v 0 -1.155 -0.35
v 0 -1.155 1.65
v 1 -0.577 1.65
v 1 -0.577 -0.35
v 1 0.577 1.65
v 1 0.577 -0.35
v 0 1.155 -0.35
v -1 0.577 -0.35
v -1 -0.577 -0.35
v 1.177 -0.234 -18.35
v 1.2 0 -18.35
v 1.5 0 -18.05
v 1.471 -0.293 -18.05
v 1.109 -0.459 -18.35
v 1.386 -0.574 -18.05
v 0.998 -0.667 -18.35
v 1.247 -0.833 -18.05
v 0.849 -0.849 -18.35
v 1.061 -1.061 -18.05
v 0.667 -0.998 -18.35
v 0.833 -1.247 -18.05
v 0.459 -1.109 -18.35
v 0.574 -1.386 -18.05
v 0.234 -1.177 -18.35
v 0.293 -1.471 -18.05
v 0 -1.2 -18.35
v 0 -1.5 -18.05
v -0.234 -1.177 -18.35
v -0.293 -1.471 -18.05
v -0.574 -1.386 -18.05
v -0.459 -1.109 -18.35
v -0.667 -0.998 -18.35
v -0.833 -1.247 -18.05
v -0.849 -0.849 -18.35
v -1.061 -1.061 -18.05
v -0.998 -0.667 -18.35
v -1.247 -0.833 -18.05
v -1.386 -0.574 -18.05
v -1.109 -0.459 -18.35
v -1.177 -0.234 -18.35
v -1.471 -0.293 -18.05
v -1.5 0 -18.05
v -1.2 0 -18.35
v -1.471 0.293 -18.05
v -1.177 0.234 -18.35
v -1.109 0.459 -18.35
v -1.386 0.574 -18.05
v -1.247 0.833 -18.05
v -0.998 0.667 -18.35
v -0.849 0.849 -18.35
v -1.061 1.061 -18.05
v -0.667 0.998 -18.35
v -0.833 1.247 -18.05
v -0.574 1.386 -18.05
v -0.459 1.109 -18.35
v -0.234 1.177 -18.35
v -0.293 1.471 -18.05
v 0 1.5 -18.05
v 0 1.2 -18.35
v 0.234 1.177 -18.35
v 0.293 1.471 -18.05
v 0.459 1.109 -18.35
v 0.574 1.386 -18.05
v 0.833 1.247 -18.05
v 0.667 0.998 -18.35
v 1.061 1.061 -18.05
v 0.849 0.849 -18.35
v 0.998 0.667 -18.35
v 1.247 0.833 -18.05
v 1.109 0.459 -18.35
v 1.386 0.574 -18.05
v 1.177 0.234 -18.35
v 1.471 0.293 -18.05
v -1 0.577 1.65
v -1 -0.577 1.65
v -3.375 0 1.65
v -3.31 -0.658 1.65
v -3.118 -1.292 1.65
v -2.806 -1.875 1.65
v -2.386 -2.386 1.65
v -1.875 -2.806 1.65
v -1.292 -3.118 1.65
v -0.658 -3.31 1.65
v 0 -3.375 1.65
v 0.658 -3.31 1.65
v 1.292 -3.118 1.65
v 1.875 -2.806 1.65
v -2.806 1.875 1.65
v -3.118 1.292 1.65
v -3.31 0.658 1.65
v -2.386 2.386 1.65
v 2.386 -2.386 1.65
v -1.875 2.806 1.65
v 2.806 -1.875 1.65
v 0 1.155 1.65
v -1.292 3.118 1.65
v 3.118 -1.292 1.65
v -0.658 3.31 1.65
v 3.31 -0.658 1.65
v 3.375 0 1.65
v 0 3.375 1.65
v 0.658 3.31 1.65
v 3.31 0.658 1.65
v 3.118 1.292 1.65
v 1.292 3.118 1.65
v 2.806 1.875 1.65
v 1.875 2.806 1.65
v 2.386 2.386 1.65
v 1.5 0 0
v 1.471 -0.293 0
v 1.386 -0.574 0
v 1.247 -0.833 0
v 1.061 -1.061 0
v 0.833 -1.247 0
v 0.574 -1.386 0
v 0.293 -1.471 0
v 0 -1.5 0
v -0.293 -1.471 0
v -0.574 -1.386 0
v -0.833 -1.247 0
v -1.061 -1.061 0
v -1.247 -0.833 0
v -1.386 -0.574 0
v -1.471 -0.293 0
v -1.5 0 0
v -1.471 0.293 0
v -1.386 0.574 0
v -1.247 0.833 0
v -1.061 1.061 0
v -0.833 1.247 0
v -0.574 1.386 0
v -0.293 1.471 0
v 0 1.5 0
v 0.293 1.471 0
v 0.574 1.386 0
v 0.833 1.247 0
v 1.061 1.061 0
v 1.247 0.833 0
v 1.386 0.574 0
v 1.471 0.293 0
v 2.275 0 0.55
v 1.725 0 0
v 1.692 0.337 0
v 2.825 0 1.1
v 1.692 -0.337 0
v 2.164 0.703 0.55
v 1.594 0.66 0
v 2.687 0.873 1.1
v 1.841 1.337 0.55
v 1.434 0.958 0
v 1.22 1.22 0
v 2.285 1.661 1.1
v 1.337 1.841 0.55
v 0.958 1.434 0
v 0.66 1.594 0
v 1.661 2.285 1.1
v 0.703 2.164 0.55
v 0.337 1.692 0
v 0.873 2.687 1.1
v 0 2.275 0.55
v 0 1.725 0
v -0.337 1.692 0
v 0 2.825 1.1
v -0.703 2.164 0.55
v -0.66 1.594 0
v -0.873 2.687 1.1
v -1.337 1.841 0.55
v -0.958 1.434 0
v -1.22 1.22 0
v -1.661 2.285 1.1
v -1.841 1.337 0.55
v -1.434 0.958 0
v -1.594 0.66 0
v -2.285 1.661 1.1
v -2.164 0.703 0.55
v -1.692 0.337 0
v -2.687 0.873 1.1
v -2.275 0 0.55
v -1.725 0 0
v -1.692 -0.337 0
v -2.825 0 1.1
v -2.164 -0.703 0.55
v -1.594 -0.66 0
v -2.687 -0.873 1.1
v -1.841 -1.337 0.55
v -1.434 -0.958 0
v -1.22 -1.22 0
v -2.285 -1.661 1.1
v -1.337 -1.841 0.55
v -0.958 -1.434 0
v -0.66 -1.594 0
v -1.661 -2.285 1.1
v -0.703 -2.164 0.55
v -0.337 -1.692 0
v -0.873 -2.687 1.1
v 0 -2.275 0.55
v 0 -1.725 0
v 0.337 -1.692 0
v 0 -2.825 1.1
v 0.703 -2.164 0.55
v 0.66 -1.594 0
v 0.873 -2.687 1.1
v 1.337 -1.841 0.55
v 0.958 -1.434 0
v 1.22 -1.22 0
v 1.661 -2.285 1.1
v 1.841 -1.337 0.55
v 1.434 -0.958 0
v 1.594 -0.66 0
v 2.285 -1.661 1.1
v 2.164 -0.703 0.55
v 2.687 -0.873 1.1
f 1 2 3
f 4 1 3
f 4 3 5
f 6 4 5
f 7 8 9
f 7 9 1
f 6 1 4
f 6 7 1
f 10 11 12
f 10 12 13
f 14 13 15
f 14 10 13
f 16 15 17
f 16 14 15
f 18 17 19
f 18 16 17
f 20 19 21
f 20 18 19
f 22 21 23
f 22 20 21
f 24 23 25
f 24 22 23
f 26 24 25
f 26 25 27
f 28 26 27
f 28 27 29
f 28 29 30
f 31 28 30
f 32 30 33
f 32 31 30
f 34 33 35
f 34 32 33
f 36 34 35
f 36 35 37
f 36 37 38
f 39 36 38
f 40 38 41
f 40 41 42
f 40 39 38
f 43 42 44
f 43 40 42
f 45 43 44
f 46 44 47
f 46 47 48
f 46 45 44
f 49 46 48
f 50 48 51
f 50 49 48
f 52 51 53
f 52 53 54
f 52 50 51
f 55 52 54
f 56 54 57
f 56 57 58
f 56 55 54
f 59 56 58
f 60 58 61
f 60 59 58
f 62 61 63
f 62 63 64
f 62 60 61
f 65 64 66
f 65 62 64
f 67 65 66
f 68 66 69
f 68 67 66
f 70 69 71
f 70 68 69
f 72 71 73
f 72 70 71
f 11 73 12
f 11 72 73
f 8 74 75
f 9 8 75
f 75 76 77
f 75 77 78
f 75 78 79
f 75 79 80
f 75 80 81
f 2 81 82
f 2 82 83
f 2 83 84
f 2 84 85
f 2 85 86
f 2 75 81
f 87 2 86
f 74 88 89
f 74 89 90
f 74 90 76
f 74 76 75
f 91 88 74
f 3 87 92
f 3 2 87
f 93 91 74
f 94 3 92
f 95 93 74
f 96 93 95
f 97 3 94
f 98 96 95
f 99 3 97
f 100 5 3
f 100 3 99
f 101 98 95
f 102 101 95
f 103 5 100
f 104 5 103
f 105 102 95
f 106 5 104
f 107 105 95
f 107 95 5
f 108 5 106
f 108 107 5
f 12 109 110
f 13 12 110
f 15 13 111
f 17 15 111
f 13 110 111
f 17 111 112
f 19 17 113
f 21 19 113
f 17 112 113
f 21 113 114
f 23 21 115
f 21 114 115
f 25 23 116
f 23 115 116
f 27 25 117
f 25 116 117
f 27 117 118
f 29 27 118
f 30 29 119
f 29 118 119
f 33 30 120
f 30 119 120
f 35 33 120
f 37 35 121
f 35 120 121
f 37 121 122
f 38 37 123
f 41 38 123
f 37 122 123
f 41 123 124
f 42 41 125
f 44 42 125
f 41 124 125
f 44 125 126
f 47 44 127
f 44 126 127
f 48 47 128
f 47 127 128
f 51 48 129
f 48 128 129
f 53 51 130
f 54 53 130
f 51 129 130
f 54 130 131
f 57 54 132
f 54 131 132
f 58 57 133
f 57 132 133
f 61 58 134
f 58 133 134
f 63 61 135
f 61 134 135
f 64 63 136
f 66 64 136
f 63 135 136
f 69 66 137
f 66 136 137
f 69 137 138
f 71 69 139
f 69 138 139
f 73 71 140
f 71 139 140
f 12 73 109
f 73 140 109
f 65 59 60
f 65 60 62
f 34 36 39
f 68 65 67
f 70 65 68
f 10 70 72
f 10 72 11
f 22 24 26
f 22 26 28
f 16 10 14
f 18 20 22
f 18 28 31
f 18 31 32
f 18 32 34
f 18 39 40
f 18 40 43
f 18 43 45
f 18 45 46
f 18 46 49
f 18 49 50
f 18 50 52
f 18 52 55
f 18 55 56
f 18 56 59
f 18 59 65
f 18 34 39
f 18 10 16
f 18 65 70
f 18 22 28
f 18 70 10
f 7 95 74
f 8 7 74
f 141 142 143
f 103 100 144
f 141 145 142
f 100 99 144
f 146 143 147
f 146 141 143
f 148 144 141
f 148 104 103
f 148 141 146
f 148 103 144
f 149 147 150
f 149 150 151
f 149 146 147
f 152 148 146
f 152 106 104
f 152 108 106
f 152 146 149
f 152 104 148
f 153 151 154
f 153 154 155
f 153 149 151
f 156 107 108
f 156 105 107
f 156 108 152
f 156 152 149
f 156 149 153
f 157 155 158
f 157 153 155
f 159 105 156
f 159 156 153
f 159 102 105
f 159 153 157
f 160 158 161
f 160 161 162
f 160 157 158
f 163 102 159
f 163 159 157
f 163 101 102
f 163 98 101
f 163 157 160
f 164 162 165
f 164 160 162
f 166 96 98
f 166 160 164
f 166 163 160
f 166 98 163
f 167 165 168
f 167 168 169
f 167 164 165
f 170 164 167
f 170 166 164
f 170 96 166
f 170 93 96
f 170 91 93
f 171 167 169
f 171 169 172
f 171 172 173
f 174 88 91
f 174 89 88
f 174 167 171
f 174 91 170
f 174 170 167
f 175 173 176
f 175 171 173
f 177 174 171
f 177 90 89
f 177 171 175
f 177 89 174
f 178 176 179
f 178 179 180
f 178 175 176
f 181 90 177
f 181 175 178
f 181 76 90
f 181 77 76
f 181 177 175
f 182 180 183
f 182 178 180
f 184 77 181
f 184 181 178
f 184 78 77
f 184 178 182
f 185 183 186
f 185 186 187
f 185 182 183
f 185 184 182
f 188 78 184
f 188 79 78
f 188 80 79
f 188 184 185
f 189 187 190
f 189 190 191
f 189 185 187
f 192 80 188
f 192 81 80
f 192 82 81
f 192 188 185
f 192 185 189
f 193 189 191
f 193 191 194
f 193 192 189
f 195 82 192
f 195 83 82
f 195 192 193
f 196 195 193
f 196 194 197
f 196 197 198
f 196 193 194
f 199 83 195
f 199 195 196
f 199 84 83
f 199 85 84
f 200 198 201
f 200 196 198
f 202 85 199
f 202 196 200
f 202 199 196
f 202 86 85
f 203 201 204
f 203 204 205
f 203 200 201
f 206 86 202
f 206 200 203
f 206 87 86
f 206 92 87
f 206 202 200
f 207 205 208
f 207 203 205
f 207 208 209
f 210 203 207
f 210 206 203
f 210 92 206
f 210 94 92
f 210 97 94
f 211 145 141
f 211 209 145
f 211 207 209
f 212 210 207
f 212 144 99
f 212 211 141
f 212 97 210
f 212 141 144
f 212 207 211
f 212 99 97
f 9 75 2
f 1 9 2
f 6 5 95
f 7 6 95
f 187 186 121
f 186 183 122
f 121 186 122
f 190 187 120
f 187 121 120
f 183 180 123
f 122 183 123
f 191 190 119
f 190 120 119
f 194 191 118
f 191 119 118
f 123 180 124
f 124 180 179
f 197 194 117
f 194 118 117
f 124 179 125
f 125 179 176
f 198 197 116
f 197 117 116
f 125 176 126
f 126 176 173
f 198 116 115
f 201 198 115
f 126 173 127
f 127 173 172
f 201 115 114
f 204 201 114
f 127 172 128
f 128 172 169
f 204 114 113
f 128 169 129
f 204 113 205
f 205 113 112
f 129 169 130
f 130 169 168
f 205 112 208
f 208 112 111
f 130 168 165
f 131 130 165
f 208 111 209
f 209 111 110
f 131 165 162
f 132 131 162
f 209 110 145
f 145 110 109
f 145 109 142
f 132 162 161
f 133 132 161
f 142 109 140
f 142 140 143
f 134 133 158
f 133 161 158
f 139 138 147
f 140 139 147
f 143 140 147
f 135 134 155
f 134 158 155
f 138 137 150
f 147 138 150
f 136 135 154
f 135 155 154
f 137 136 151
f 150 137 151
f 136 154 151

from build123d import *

# Parameters (mm, degrees)
SKETCH1_R           = 3.375
BOSS_EXTRUDE1_DEPTH = 1.65
SKETCH2_R           = 1.5
BOSS_EXTRUDE2_DEPTH = 18.35
CHAMFER1_SIZE       = 0.3
CUT_EXTRUDE1_DEPTH  = 2
CHAMFER2_SIZE       = 1.65


with BuildPart() as part:
    # Sketch1 → Boss-Extrude1 (new body)
    with BuildSketch(Plane.XY):
        Circle(SKETCH1_R)
    extrude(amount=BOSS_EXTRUDE1_DEPTH)

    # Sketch2 → Boss-Extrude2 (add)
    with BuildSketch(Plane(origin=(0, 0, 0), x_dir=(-1, 0, 0), z_dir=(0, 0, -1))):
        with Locations(Location((0, 0, 0), (0, 0, 180))):
            Circle(SKETCH2_R)
    extrude(amount=BOSS_EXTRUDE2_DEPTH)

    # Chamfer1
    chamfer1_edges = [part.edges().sort_by_distance(p)[0] for p in [
        (-1.5, 0, -18.35),
    ]]
    chamfer(chamfer1_edges, length=CHAMFER1_SIZE)

    # Sketch3 → Cut-Extrude1 (cut)
    with BuildSketch(Plane.XY.offset(1.65)):
        Polygon((0, 1.154700538), (-1, 0.577350269), (-1, -0.577350269), (0, -1.154700538), (1, -0.577350269), (1, 0.577350269), align=None)
    extrude(amount=-CUT_EXTRUDE1_DEPTH, mode=Mode.SUBTRACT)

    # Chamfer2
    chamfer2_edges = [part.edges().sort_by_distance(p)[0] for p in [
        (-3.375, 0, 0),
    ]]
    chamfer(chamfer2_edges, length=CHAMFER2_SIZE - 0.0001)  # a hair under: the kernel refuses the full size


solid = part.part
